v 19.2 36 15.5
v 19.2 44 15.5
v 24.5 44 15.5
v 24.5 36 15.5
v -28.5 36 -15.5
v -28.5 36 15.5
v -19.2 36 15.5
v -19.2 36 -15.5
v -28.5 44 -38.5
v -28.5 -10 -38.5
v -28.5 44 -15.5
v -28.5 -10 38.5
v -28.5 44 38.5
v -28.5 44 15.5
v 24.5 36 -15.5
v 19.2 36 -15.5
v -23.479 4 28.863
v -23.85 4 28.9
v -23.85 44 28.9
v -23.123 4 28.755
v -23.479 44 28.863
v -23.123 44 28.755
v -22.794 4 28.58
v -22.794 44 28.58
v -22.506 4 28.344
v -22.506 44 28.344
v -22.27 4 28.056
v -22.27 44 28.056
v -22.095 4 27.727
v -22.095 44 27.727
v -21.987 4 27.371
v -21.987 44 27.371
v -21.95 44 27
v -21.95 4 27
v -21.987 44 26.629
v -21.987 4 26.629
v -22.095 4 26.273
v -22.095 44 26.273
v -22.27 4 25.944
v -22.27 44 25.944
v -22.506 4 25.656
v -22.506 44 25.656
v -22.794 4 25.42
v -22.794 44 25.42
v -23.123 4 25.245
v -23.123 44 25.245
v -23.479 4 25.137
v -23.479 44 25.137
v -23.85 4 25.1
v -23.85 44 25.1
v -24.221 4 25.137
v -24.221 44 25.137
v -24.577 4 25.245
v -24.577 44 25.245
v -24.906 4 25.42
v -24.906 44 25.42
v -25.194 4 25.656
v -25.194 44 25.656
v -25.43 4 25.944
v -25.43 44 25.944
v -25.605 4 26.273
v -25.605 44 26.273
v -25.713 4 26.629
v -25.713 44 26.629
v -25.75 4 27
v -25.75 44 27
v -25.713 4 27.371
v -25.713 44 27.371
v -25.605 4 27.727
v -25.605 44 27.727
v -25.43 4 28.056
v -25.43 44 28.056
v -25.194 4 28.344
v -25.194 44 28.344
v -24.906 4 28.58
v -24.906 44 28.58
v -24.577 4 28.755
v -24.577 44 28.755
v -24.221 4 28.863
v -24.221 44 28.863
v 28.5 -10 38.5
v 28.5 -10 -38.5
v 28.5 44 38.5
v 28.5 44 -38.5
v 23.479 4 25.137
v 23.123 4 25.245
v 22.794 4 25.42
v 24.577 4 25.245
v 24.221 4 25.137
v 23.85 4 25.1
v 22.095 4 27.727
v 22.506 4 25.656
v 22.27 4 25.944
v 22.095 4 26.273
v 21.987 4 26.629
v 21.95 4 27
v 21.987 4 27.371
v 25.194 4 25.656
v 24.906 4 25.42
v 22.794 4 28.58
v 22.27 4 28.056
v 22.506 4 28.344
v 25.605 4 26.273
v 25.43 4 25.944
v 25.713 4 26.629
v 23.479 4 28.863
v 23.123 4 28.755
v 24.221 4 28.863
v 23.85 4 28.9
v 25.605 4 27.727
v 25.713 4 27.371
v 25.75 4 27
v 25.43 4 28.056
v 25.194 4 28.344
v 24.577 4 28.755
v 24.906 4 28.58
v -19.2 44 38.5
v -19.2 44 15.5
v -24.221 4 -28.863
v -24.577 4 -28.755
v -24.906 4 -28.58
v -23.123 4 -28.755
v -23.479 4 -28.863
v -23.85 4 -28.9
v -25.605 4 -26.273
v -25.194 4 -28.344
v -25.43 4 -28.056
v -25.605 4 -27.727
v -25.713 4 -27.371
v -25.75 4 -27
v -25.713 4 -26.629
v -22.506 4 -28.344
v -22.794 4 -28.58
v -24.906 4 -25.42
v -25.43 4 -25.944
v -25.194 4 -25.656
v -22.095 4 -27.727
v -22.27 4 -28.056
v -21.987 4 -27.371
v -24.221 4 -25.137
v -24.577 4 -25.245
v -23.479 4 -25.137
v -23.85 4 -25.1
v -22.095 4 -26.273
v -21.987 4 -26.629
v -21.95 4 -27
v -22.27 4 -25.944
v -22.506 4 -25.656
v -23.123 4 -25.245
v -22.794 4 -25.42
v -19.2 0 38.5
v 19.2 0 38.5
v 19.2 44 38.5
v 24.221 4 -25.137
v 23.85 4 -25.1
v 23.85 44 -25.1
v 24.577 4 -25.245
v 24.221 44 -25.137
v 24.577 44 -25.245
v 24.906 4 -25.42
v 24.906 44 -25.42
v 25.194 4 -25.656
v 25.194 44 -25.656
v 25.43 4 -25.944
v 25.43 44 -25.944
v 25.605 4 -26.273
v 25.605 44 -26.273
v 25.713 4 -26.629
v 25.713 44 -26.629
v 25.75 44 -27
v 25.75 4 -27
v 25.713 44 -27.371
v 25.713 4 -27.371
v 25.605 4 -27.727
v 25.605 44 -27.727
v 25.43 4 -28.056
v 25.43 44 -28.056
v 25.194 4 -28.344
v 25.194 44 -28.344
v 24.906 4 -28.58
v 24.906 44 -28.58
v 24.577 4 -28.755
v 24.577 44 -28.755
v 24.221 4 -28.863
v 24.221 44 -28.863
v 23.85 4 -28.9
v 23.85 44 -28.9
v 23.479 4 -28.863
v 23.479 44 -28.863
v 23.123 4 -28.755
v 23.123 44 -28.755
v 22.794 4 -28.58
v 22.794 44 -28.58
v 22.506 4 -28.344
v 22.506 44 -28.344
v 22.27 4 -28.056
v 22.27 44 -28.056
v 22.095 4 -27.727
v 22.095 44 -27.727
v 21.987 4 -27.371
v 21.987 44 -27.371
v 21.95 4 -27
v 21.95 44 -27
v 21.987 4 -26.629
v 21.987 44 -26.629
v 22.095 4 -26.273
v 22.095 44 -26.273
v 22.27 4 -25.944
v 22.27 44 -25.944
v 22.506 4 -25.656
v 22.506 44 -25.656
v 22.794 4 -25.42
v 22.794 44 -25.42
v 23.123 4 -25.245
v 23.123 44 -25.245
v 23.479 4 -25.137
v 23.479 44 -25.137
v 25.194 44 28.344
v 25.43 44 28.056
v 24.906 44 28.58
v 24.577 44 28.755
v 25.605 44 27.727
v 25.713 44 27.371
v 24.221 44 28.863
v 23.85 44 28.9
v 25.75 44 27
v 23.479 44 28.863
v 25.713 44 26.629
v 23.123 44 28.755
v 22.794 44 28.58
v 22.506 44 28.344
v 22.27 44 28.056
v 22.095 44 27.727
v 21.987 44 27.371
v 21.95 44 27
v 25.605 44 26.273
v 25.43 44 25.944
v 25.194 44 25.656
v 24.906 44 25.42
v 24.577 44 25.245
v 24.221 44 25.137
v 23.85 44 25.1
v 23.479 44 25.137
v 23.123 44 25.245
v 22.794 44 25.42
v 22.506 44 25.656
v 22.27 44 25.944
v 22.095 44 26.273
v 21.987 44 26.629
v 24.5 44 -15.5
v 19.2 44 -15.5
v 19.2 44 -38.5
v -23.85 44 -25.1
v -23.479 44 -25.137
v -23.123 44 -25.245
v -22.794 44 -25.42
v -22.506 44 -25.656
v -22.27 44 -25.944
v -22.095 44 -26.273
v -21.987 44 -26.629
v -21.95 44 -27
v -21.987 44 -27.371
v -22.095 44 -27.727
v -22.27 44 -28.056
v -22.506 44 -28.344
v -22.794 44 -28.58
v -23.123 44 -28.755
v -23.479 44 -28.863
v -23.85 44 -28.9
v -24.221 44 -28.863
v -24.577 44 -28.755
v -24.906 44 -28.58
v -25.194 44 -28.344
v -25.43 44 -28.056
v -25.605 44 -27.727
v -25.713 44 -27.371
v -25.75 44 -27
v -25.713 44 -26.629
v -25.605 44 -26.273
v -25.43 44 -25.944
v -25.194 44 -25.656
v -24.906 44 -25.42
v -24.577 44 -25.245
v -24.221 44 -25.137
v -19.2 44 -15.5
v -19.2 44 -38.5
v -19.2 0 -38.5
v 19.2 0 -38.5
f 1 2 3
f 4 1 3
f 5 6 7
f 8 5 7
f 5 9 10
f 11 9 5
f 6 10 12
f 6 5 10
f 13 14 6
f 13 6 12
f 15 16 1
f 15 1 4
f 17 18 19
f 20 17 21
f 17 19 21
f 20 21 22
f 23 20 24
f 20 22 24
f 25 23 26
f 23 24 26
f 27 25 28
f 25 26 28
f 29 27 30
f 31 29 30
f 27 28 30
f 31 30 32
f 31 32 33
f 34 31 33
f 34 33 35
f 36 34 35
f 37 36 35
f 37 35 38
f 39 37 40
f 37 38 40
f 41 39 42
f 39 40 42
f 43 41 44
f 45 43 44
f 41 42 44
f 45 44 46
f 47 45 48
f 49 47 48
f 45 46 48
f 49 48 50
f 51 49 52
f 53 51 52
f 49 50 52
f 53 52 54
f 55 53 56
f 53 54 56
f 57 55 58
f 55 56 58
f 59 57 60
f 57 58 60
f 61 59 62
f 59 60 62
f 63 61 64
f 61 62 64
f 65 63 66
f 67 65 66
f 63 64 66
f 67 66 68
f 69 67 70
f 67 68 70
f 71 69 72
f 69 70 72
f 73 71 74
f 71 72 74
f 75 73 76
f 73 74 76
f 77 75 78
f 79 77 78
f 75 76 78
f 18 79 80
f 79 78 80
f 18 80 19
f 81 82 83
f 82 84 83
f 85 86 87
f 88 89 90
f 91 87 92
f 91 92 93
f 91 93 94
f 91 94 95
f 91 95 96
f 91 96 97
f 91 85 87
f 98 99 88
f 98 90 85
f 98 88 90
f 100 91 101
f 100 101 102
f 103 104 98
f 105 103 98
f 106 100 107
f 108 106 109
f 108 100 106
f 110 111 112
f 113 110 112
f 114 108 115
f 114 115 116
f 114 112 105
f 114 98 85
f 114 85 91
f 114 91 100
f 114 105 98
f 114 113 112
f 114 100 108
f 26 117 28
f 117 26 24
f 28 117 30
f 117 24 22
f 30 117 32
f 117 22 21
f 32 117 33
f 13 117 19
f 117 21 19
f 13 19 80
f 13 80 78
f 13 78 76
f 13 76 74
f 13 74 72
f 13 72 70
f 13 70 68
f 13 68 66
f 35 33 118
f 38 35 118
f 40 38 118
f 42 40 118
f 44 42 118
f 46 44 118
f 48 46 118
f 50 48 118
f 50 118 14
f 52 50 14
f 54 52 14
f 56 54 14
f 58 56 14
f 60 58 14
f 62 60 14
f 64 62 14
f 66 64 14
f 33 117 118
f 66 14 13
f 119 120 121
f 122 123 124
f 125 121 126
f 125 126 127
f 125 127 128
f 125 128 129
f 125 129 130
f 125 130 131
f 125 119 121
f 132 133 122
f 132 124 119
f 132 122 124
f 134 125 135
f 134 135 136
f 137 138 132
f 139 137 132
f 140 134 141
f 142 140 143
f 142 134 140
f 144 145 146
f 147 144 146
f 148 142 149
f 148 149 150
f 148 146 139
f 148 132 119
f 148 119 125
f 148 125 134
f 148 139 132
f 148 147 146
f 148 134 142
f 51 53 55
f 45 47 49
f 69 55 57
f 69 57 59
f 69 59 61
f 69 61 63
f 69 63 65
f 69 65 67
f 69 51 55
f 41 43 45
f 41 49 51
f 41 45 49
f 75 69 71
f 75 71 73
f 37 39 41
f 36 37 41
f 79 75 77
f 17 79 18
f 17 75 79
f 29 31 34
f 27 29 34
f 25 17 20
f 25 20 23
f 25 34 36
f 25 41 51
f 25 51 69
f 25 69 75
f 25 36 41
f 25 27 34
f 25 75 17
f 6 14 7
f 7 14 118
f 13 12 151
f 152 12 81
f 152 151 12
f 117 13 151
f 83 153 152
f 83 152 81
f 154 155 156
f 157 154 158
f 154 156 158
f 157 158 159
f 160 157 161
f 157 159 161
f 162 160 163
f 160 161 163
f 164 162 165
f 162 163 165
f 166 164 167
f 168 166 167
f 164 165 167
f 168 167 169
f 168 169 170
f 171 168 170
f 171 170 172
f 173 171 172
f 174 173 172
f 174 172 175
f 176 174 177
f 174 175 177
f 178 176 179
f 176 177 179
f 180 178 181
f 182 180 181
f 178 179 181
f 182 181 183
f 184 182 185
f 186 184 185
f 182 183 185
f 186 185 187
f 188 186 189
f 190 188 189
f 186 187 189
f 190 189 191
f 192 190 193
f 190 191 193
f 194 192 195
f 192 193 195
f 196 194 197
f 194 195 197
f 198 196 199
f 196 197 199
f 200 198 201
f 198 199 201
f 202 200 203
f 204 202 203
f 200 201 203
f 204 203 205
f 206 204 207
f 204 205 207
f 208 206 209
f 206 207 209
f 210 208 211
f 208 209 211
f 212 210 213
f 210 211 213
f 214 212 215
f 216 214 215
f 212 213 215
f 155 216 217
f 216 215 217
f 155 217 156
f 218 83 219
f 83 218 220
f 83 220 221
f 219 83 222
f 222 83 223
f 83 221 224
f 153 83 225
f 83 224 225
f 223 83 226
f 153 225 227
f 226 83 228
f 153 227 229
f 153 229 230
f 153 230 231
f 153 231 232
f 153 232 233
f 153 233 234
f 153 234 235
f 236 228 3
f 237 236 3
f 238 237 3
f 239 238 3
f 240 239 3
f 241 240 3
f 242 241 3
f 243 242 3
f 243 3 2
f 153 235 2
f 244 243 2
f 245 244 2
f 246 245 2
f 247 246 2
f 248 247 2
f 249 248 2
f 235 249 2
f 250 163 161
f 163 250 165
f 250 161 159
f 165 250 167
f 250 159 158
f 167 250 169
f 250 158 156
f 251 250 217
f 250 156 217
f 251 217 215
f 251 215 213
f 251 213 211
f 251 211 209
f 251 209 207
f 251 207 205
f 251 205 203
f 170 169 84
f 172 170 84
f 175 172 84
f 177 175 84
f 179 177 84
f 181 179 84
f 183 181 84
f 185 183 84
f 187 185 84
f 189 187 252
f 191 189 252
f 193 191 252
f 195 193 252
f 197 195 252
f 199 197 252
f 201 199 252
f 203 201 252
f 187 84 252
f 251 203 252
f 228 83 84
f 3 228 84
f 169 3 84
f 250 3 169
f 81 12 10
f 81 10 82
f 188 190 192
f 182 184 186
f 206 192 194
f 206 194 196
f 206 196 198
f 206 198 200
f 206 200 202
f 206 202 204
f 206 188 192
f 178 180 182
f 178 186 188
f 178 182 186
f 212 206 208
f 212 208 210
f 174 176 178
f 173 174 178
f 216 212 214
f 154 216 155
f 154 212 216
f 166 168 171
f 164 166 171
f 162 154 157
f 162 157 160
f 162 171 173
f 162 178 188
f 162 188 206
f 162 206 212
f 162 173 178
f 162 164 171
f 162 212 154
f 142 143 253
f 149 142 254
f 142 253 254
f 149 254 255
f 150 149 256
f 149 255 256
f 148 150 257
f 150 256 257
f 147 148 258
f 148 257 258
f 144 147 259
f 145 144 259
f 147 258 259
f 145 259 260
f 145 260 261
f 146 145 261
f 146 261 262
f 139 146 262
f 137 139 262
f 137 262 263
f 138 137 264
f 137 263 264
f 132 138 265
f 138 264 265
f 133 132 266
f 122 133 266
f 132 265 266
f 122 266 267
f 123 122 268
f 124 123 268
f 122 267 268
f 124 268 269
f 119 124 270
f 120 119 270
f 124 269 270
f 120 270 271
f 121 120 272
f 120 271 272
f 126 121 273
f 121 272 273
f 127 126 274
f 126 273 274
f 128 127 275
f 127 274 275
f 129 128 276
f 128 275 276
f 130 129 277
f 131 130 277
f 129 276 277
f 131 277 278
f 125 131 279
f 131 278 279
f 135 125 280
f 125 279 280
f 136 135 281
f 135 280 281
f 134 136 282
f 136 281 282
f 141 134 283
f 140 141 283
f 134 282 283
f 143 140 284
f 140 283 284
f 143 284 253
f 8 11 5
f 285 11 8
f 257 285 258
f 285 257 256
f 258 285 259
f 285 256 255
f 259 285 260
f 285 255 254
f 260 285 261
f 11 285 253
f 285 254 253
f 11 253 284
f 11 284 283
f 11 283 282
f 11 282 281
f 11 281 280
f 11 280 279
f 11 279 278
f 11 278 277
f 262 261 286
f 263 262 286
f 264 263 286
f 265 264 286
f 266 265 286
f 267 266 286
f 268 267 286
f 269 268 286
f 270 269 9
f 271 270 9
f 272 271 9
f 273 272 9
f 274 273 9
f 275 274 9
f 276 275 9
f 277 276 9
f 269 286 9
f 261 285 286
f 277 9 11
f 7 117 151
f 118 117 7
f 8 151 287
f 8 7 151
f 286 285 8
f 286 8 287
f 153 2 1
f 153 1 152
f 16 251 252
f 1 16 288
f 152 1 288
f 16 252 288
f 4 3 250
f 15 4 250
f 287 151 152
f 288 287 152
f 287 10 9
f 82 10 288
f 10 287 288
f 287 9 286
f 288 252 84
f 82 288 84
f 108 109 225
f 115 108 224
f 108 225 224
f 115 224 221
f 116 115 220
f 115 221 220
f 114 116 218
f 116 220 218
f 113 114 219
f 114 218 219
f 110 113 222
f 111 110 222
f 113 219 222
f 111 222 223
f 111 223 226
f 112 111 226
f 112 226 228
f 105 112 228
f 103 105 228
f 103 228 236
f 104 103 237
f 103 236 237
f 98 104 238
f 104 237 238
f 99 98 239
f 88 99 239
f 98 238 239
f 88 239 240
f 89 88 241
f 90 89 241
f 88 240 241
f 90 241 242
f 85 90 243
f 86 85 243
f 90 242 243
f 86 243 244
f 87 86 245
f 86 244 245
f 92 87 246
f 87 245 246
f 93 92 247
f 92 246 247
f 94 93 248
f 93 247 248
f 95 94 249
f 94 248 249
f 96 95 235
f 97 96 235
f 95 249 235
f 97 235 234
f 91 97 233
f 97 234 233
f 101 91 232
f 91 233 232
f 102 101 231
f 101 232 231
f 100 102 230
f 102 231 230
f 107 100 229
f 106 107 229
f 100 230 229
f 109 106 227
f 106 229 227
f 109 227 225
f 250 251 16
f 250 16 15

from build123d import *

# Parameters (mm, degrees)
SKETCH1_W           = 57
SKETCH1_H           = 37
BOSS_EXTRUDE1_DEPTH = 44
SKETCH2_W           = 38.4
SKETCH2_H           = 36
CUT_EXTRUDE1_DEPTH  = 47
BOSS_EXTRUDE2_DEPTH = 20
BOSS_EXTRUDE3_DEPTH = 20
SKETCH7_W           = 53
SKETCH7_H           = 31
CUT_EXTRUDE4_DEPTH  = 8
SKETCH8_R           = 1.9
CUT_EXTRUDE5_DEPTH  = 40
SKETCH10_W          = 57
SKETCH10_H          = 77
BOSS_EXTRUDE4_DEPTH = 10
SKETCH12_W          = 38.4
SKETCH12_H          = 77
CUT_EXTRUDE6_DEPTH  = 8


with BuildPart() as part:
    # Sketch1 → Boss-Extrude1 (new body)
    with BuildSketch(Plane(origin=(0, 0, 0), x_dir=(1, 0, 0), z_dir=(0, 1, 0))):
        Rectangle(SKETCH1_W, SKETCH1_H)
    extrude(amount=BOSS_EXTRUDE1_DEPTH)

    # Sketch2 → Cut-Extrude1 (cut)
    with BuildSketch(Plane.XY.offset(18.5)):
        with Locations((0, 18)):
            Rectangle(SKETCH2_W, SKETCH2_H)
    extrude(amount=-CUT_EXTRUDE1_DEPTH, mode=Mode.SUBTRACT)

    # Sketch5 → Boss-Extrude2 (add)
    with BuildSketch(Plane(origin=(0, 0, -18.5), x_dir=(-1, 0, 0), z_dir=(0, 0, -1))):
        Polygon((-19.2, 36), (19.2, 36), (19.2, 0), (28.5, 0), (28.5, 44), (-28.5, 44), (-28.5, 0), (-19.2, 0), align=None)
    extrude(amount=BOSS_EXTRUDE2_DEPTH)

    # Sketch6 → Boss-Extrude3 (add)
    with BuildSketch(Plane.XY.offset(18.5)):
        Polygon((-28.5, 0), (-19.2, 0), (-19.2, 36), (19.2, 36), (19.2, 0), (28.5, 0), (28.5, 44), (-28.5, 44), align=None)
    extrude(amount=BOSS_EXTRUDE3_DEPTH)

    # Sketch7 → Cut-Extrude4 (cut)
    with BuildSketch(Plane(origin=(0, 44, 0), x_dir=(1, 0, 0), z_dir=(0, 1, 0))):
        with Locations((-2, 0)):
            Rectangle(SKETCH7_W, SKETCH7_H)
    extrude(amount=-CUT_EXTRUDE4_DEPTH, mode=Mode.SUBTRACT)

    # Sketch8 → Cut-Extrude5 (cut)
    with BuildSketch(Plane(origin=(0, 44, 0), x_dir=(1, 0, 0), z_dir=(0, 1, 0))):
        with Locations((-23.85, 27)):
            Circle(SKETCH8_R)
        with Locations((23.85, 27)):
            Circle(SKETCH8_R)
        with Locations((-23.85, -27)):
            Circle(SKETCH8_R)
        with Locations((23.85, -27)):
            Circle(SKETCH8_R)
    extrude(amount=-CUT_EXTRUDE5_DEPTH, mode=Mode.SUBTRACT)

    # Sketch10 → Boss-Extrude4 (add)
    with BuildSketch(Plane.XZ):
        Rectangle(SKETCH10_W, SKETCH10_H)
    extrude(amount=BOSS_EXTRUDE4_DEPTH)

    # Sketch12 → Cut-Extrude6 (cut)
    with BuildSketch(Plane(origin=(0, 44, 0), x_dir=(1, 0, 0), z_dir=(0, 1, 0))):
        Rectangle(SKETCH12_W, SKETCH12_H)
    extrude(amount=-CUT_EXTRUDE6_DEPTH, mode=Mode.SUBTRACT)


solid = part.part
